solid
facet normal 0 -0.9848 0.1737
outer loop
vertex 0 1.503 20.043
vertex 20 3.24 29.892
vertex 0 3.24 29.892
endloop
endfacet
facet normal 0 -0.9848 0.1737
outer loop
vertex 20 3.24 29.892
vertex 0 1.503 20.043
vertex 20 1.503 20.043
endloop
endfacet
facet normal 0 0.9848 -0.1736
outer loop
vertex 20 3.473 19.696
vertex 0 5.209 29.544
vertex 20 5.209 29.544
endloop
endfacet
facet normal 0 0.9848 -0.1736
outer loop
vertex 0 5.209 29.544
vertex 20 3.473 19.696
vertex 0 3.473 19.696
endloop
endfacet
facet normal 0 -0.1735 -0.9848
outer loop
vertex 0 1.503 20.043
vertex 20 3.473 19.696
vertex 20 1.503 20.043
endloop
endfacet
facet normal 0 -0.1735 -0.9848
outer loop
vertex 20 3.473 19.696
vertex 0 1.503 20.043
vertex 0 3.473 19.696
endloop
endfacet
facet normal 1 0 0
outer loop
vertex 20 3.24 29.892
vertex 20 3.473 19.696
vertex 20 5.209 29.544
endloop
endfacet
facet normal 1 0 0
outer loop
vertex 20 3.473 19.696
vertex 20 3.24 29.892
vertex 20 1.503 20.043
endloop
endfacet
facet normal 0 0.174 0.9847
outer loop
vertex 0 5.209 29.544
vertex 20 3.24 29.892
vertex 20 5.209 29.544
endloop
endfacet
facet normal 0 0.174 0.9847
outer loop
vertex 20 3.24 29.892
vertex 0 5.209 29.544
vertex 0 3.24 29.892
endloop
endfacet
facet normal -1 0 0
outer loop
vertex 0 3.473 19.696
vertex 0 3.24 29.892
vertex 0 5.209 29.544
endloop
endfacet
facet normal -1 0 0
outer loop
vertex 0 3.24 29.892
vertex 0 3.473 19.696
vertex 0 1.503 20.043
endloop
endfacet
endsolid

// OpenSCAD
rotate([80,0,0]){
    translate([0,20,0]){
        cube([20,10,2]);
    }
}
